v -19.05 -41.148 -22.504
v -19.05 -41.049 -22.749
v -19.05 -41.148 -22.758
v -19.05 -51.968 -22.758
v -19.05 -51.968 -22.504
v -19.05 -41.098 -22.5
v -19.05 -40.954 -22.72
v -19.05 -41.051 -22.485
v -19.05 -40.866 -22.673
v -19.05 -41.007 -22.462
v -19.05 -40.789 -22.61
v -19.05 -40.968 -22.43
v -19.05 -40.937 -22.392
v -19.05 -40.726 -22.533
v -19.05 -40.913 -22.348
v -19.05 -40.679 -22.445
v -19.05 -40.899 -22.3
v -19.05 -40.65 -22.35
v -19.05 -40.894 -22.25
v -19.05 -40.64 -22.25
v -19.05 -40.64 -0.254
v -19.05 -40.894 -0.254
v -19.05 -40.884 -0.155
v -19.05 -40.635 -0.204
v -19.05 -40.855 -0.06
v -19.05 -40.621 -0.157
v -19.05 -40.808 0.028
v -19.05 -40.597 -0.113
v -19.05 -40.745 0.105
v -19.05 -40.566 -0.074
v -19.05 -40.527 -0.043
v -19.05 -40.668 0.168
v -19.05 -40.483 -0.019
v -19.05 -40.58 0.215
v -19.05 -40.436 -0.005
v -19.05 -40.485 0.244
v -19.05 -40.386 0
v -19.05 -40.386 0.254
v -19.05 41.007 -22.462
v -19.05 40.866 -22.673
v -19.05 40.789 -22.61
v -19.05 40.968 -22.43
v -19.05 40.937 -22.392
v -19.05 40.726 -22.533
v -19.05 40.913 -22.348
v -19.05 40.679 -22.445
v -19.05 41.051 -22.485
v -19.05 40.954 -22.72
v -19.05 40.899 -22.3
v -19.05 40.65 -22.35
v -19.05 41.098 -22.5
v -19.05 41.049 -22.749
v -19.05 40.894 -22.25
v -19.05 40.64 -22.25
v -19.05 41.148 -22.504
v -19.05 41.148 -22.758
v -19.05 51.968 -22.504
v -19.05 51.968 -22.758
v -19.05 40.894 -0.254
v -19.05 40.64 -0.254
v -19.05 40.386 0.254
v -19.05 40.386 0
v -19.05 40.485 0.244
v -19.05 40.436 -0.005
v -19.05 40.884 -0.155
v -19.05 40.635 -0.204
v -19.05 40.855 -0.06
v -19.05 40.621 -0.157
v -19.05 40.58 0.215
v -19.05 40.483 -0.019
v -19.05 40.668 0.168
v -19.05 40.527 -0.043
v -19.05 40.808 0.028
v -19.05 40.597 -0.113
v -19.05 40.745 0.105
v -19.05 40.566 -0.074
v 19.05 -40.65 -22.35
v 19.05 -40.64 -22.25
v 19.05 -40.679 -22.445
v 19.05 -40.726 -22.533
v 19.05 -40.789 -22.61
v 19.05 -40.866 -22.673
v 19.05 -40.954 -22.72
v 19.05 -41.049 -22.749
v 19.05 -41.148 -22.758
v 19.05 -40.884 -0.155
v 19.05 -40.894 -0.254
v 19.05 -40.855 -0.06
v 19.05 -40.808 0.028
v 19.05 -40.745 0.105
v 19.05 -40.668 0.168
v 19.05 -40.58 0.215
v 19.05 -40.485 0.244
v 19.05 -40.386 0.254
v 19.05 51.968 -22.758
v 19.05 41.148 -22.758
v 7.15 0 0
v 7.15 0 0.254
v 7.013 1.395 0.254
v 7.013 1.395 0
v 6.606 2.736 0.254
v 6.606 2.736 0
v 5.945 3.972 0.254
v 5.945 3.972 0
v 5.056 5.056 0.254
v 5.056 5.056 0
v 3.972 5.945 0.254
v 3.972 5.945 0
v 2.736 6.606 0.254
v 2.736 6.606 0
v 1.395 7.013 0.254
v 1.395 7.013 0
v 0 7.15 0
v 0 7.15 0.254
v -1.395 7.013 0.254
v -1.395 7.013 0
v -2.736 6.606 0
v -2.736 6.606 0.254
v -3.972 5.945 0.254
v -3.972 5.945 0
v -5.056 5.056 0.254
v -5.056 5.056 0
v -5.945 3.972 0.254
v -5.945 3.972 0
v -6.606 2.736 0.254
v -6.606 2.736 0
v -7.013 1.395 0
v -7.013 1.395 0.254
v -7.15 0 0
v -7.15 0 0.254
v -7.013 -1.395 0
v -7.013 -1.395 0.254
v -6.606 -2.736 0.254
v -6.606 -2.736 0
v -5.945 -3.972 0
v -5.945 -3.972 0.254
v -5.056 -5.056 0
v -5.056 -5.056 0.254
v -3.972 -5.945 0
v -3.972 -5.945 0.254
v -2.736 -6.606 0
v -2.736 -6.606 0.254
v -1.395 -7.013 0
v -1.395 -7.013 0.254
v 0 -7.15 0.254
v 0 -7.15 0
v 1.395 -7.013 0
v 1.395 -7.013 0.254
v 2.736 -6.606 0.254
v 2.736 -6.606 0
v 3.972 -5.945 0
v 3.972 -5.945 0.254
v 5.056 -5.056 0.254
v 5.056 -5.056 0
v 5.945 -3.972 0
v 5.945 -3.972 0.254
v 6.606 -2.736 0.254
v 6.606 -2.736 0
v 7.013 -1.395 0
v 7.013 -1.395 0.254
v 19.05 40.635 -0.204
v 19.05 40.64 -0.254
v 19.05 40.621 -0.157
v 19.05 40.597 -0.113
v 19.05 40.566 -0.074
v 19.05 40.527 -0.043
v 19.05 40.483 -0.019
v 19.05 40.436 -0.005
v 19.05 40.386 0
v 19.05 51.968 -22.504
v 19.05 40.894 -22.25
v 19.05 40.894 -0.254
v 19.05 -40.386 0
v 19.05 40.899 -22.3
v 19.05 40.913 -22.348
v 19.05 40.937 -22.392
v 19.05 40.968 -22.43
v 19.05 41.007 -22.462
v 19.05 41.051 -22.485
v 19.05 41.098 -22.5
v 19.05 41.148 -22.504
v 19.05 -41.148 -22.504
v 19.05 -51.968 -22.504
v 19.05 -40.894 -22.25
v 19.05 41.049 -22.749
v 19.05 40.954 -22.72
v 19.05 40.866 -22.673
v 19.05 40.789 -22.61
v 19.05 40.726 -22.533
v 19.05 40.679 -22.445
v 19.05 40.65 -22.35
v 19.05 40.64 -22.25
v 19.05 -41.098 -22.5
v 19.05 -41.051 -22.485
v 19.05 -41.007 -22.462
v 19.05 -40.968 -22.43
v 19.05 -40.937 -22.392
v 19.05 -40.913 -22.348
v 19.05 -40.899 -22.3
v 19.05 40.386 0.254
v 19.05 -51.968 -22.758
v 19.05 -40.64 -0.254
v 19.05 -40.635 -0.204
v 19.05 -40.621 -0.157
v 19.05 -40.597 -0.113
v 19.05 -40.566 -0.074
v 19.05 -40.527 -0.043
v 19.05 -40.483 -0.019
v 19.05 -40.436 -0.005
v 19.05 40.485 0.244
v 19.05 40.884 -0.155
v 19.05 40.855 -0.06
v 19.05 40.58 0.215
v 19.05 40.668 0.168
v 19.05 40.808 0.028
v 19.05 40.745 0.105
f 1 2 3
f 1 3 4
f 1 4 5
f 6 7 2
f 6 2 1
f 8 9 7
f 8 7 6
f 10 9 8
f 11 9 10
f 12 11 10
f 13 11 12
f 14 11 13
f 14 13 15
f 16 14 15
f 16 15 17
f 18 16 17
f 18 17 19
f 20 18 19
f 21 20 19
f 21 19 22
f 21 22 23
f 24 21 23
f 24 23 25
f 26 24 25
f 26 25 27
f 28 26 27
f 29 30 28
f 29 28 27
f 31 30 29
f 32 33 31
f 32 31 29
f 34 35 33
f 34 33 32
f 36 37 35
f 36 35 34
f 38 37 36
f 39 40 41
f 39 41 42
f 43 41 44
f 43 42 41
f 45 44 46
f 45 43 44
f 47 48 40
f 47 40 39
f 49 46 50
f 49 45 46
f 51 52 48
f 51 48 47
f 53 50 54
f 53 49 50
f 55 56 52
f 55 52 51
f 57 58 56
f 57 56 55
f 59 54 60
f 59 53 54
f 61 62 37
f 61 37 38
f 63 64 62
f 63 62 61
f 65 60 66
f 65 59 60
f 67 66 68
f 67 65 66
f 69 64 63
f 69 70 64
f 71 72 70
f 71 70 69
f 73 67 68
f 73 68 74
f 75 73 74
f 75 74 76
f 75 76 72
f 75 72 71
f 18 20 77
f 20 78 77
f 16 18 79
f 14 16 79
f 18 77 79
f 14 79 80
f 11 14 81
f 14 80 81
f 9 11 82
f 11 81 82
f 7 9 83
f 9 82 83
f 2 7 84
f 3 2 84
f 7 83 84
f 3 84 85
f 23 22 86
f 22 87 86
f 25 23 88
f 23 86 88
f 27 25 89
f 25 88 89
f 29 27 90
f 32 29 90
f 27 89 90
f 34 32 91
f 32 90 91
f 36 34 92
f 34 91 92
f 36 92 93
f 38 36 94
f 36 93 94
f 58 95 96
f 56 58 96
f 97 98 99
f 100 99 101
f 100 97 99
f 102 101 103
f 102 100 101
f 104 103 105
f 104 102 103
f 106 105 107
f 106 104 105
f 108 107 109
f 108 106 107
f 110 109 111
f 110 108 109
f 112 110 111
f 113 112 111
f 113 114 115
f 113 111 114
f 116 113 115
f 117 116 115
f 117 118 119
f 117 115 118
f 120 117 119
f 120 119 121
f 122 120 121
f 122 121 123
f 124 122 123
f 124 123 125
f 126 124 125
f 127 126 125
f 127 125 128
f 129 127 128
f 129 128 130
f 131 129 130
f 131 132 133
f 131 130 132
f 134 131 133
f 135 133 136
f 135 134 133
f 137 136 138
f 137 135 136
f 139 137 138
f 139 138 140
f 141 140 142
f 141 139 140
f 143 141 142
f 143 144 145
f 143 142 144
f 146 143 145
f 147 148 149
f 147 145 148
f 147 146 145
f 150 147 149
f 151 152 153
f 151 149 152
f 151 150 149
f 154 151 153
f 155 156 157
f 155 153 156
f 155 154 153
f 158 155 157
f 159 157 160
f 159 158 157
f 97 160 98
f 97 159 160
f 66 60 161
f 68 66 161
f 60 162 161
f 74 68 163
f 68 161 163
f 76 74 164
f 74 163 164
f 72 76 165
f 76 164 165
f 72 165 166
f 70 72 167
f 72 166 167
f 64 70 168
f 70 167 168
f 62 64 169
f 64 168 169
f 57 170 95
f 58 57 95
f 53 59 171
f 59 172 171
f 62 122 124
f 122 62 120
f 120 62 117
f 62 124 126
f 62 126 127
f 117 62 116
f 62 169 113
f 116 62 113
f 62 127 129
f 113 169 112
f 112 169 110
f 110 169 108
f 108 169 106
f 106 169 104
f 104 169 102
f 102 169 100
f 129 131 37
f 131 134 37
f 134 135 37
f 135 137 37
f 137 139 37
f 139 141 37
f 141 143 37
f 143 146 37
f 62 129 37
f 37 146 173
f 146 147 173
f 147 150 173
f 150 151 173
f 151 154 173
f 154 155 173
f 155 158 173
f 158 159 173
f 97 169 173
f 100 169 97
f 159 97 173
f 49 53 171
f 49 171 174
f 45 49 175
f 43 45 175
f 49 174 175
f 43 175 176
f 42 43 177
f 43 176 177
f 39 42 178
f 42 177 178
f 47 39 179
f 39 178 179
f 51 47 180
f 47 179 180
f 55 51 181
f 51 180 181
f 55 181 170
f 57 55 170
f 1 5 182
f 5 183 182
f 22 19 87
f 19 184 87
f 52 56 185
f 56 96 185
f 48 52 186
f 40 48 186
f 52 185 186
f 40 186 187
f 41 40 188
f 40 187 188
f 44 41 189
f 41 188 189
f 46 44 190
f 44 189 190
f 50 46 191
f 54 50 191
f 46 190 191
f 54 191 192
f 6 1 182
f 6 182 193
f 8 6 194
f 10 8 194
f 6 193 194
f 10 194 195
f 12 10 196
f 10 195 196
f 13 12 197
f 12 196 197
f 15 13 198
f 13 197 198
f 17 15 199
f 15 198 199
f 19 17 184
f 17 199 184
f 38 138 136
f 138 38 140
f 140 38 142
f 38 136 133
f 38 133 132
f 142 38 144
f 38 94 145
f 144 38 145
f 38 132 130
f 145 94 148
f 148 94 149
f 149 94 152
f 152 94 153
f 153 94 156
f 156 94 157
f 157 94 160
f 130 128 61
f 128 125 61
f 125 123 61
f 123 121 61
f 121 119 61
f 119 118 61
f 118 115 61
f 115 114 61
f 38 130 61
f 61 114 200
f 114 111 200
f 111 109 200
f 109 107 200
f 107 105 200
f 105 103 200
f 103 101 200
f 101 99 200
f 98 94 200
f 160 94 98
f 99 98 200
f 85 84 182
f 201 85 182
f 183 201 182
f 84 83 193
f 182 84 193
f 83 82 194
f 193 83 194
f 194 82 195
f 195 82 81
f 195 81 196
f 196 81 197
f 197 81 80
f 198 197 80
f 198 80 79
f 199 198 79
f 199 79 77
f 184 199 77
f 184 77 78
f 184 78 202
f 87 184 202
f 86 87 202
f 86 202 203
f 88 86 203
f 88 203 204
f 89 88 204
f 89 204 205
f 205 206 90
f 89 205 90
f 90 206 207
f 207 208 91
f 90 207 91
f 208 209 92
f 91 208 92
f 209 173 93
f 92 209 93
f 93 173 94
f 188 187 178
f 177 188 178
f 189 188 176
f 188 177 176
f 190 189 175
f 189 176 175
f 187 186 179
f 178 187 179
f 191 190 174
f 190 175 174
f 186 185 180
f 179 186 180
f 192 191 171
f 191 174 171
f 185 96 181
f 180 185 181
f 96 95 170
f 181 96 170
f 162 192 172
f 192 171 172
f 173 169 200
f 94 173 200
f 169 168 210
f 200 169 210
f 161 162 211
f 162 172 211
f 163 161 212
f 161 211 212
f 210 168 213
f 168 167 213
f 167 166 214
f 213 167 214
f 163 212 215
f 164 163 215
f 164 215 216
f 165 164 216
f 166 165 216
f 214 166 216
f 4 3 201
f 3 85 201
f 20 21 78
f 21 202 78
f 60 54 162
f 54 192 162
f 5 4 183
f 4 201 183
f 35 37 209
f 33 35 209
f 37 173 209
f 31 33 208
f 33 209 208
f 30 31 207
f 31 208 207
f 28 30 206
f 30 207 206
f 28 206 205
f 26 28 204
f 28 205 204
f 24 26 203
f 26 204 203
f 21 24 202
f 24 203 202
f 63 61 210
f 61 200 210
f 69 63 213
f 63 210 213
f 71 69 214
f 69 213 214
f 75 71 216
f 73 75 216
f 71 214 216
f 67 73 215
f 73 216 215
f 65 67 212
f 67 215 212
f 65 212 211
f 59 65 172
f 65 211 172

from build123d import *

# Parameters (mm, degrees)
BASE_FLANGE1_DEPTH = 19.05
SKETCH5_R          = 7.1501
CUT_EXTRUDE1_DEPTH = 60.846151665


# Sheet-metal steps are written as plain solids
with BuildPart() as part:
    # Sketch1 → Base-Flange1 (new, symmetric)
    with BuildSketch(Plane(origin=(0, 0, 0), x_dir=(0, 0, -1), z_dir=(1, 0, 0))):
        with BuildLine():
            Line((22.7584, 51.9684), (22.7584, 41.148))
            ThreePointArc((22.7584, 41.148), (22.609610245, 40.788789755), (22.2504, 40.64))
            Line((22.2504, 40.64), (0.254, 40.64))
            ThreePointArc((0.254, 40.64), (0.074394878, 40.565605122), (0, 40.386))
            Line((0, 40.386), (0, -40.386))
            ThreePointArc((0, -40.386), (0.074394878, -40.565605122), (0.254, -40.64))
            Line((0.254, -40.64), (22.2504, -40.64))
            ThreePointArc((22.2504, -40.64), (22.609610245, -40.788789755), (22.7584, -41.148))
            Line((22.7584, -41.148), (22.7584, -51.9684))
            Line((22.7584, -51.9684), (22.5044, -51.9684))
            Line((22.5044, -51.9684), (22.5044, -41.148))
            ThreePointArc((22.5044, -41.148), (22.430005122, -40.968394878), (22.2504, -40.894))
            Line((22.2504, -40.894), (0.254, -40.894))
            ThreePointArc((0.254, -40.894), (-0.105210245, -40.745210245), (-0.254, -40.386))
            Line((-0.254, -40.386), (-0.254, 40.386))
            ThreePointArc((-0.254, 40.386), (-0.105210245, 40.745210245), (0.254, 40.894))
            Line((0.254, 40.894), (22.2504, 40.894))
            ThreePointArc((22.2504, 40.894), (22.430005122, 40.968394878), (22.5044, 41.148))
            Line((22.5044, 41.148), (22.5044, 51.9684))
            Line((22.5044, 51.9684), (22.7584, 51.9684))
        make_face()
    extrude(amount=BASE_FLANGE1_DEPTH, both=True)

    # Sketch5 → Cut-Extrude1 (cut, through all)
    with BuildSketch(Plane.XY):
        Circle(SKETCH5_R)
    extrude(amount=CUT_EXTRUDE1_DEPTH, mode=Mode.SUBTRACT)


solid = part.part
